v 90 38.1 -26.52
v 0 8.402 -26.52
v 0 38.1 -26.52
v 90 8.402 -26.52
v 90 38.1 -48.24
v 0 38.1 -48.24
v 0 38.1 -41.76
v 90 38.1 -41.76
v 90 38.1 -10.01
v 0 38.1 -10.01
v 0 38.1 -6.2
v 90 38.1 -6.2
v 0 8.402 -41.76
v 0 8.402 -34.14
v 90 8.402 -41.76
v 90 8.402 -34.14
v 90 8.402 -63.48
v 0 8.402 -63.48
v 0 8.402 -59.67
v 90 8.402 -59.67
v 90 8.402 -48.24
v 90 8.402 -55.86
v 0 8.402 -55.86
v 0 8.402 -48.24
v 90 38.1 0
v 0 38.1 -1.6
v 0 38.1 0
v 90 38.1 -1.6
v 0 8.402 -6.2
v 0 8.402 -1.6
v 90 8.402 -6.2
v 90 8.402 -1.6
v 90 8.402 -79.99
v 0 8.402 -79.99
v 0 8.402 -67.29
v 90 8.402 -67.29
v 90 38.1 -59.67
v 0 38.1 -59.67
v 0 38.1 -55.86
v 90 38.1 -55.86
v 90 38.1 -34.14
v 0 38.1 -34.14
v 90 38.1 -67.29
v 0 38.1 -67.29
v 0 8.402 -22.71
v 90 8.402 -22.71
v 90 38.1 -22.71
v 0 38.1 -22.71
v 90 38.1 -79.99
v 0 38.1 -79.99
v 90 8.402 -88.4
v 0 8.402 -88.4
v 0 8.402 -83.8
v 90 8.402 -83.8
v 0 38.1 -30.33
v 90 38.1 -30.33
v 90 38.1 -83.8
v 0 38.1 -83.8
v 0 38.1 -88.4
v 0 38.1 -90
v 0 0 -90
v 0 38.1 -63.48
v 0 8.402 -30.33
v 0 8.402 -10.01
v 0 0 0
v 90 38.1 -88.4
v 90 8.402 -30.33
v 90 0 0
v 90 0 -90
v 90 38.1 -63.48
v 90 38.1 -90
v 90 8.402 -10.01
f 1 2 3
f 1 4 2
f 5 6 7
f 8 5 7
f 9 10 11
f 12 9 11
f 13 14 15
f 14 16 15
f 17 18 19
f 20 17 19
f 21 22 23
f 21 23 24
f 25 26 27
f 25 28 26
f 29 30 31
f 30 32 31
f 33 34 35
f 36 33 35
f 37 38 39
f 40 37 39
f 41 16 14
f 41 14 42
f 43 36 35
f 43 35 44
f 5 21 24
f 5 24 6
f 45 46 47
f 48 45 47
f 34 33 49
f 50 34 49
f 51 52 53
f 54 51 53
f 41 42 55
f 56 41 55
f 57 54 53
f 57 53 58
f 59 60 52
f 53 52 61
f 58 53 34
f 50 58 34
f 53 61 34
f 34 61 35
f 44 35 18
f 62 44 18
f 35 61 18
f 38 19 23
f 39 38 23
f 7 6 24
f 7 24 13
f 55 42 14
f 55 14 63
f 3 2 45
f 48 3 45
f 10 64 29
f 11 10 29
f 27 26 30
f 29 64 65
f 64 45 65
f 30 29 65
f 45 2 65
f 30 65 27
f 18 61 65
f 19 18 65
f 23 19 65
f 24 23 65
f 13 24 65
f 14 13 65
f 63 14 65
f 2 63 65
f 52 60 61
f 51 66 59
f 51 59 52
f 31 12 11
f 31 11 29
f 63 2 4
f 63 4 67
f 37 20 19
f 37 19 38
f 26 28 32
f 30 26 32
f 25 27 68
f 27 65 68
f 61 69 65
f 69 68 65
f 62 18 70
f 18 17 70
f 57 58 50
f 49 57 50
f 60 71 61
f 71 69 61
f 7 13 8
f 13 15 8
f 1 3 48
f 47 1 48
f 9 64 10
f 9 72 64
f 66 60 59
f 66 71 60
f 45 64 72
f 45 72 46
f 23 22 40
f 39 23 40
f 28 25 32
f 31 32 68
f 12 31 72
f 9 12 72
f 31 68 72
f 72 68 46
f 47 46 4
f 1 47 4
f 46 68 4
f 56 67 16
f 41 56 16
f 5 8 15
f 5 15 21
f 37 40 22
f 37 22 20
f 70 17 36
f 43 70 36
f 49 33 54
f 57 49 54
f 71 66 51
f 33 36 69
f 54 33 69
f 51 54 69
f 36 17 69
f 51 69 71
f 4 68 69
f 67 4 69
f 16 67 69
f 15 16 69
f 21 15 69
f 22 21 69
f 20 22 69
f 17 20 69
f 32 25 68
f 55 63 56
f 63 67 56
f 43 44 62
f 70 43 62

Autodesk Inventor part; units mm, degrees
ref_plane "YZ Plane" through (0, 0, 0) normal (1, 0, 0) x (0, 1, 0)
ref_plane "XZ Plane" through (0, 0, 0) normal (0, 1, 0) x (-1, 0, 0)
ref_plane "XY Plane" through (0, 0, 0) normal (0, 0, 1) x (1, 0, 0)
sketch "Sketch1" plane through (0, 0, 0) normal (0, 1, 0) x (-1, 0, 0)
  line L0 (0, 0) -> (-90, 0)
  line L1 (-90, 0) -> (-90, -90)
  line L2 (-90, -90) -> (0, -90)
  line L3 (0, -90) -> (0, 0)
  dimension "d0" = 90
  dimension "d1" = 90
extrude "Extrusion1" add sketch "Sketch1" along normal blind 88.9
sketch "Sketch2" plane through (90, 0, 0) normal (1, 0, 0) x (0, 0, -1)
  line L0 (0, 0) -> (90, 0) projected
  line L1 (90, 0) -> (90, 88.9) projected
  line L2 (0, 88.9) -> (90, 88.9) projected
  line L3 (0, 0) -> (0, 88.9) projected
  line L4 (0, 88.9) -> (1.6, 88.9)
  line L5 (0, 88.9) -> (90, 88.9) projected
  line L6 (1.6, 88.9) -> (6.2, 88.9)
  line L7 (6.2, 88.9) -> (7.8, 88.9)
  line L8 (7.8, 88.9) -> (7.8, 8.402)
  line L9 (6.2, 88.9) -> (6.2, 8.402)
  line L10 (1.6, 88.9) -> (1.6, 8.402)
  line L11 (1.6, 8.402) -> (6.2, 8.402)
  line L12 (90, 88.9) -> (88.4, 88.9)
  line L13 (88.4, 88.9) -> (88.4, 8.402)
  line L14 (88.4, 8.402) -> (83.8, 8.402)
  line L15 (83.8, 8.402) -> (83.8, 88.9)
  dimension "d4" = 1.6
  dimension "d5" = 4.6
  dimension "d6" = 1.6
  dimension "d7" = 1.6
  dimension "d8" = 4.6
extrude "Extrusion2" cut sketch "Sketch2" against normal blind 127 contours L2 L9 L11 L10 | L13 L14 L15 L2
sketch "Sketch3" plane through (90, 0, 0) normal (1, 0, 0) x (0, 0, -1)
  line L0 (1.6, 8.402) -> (1.6, 88.9) projected
  line L1 (0, 88.9) -> (1.6, 88.9) projected
  line L2 (0, 0) -> (0, 88.9) projected
  line L3 (0, 0) -> (90, 0) projected
  line L4 (90, 0) -> (90, 88.9) projected
  line L5 (88.4, 88.9) -> (90, 88.9) projected
  line L6 (88.4, 88.9) -> (88.4, 8.402) projected
  line L7 (88.4, 8.402) -> (83.8, 8.402) projected
  line L8 (83.8, 8.402) -> (83.8, 88.9) projected
  line L9 (6.2, 88.9) -> (83.8, 88.9) projected
  line L10 (6.2, 88.9) -> (6.2, 8.402) projected
  line L11 (6.2, 8.402) -> (1.6, 8.402) projected
sketch "Sketch5" plane through (90, 0, 0) normal (1, 0, 0) x (0, 0, -1)
  line L0 (-0.0003, 88.9) -> (90, 88.9)
  line L1 (90, 88.9) -> (90, 38.1)
  line L2 (90, 38.1) -> (-0.0003, 38.1)
  line L3 (-0.0003, 38.1) -> (-0.0003, 88.9)
  point P0 (0, 0)
  dimension "d24" = 50.8
extrude "Extrusion3" cut sketch "Sketch5" against normal blind 111.125
sketch "Sketch6" plane through (90, 0, 0) normal (1, 0, 0) x (0, 0, -1)
  line L0 (1.6, 38.1) -> (0, 38.1) projected
  line L1 (0, 0) -> (0, 38.1) projected
  line L2 (0, 0) -> (90, 0) projected
  line L3 (90, 0) -> (90, 38.1) projected
  line L4 (90, 38.1) -> (88.4, 38.1) projected
  line L5 (88.4, 38.1) -> (88.4, 8.402) projected
  line L6 (88.4, 8.402) -> (83.8, 8.402) projected
  line L7 (83.8, 8.402) -> (83.8, 38.1) projected
  line L8 (83.8, 38.1) -> (6.2, 38.1) projected
  line L9 (6.2, 38.1) -> (6.2, 8.402) projected
  line L10 (6.2, 8.402) -> (1.6, 8.402) projected
  line L11 (1.6, 8.402) -> (1.6, 38.1) projected
  line L12 (6.2, 38.1) -> (6.2, 8.402)
  line L13 (6.2, 8.402) -> (10.01, 8.402)
  line L14 (10.01, 8.402) -> (10.01, 38.1)
  line L15 (10.01, 38.1) -> (6.2, 38.1)
  line L16 (10.01, 38.1) -> (10.01, 8.402)
  line L17 (10.01, 8.402) -> (22.71, 8.402)
  line L18 (22.71, 8.402) -> (22.71, 38.1)
  line L19 (22.71, 38.1) -> (10.01, 38.1)
  line L20 (22.71, 38.1) -> (22.71, 8.402)
  line L21 (22.71, 8.402) -> (26.52, 8.402)
  line L22 (26.52, 8.402) -> (26.52, 38.1)
  line L23 (26.52, 38.1) -> (22.71, 38.1)
  line L24 (26.52, 38.1) -> (26.52, 8.402)
  line L25 (26.52, 8.402) -> (30.33, 8.402)
  line L26 (30.33, 8.402) -> (30.33, 38.1)
  line L27 (30.33, 38.1) -> (26.52, 38.1)
  line L28 (30.33, 38.1) -> (30.33, 8.402)
  line L29 (30.33, 8.402) -> (34.14, 8.402)
  line L30 (34.14, 8.402) -> (34.14, 38.1)
  line L31 (34.14, 38.1) -> (30.33, 38.1)
  line L32 (83.8, 38.1) -> (83.8, 8.402)
  line L33 (83.8, 8.402) -> (79.99, 8.402)
  line L34 (79.99, 8.402) -> (79.99, 38.1)
  line L35 (79.99, 38.1) -> (83.8, 38.1)
  line L36 (79.99, 38.1) -> (79.99, 8.402)
  line L37 (79.99, 8.402) -> (67.29, 8.402)
  line L38 (67.29, 8.402) -> (67.29, 38.1)
  line L39 (67.29, 38.1) -> (79.99, 38.1)
  line L40 (67.29, 38.1) -> (67.29, 8.402)
  line L41 (67.29, 8.402) -> (63.48, 8.402)
  line L42 (63.48, 8.402) -> (63.48, 38.1)
  line L43 (63.48, 38.1) -> (67.29, 38.1)
  line L44 (63.48, 38.1) -> (63.48, 8.402)
  line L45 (63.48, 8.402) -> (59.67, 8.402)
  line L46 (59.67, 8.402) -> (59.67, 38.1)
  line L47 (59.67, 38.1) -> (63.48, 38.1)
  line L48 (59.67, 38.1) -> (59.67, 8.402)
  line L49 (59.67, 8.402) -> (55.86, 8.402)
  line L50 (55.86, 8.402) -> (55.86, 38.1)
  line L51 (55.86, 38.1) -> (59.67, 38.1)
  line L52 (55.86, 38.1) -> (55.86, 8.402)
  line L53 (55.86, 8.402) -> (48.24, 8.402)
  line L54 (48.24, 8.402) -> (48.24, 38.1)
  line L55 (48.24, 38.1) -> (55.86, 38.1)
  line L56 (34.14, 38.1) -> (34.14, 8.402)
  line L57 (34.14, 8.402) -> (41.76, 8.402)
  line L58 (41.76, 8.402) -> (41.76, 38.1)
  line L59 (41.76, 38.1) -> (34.14, 38.1)
  dimension "d27" = 3.81
  dimension "d28" = 12.7
  dimension "d29" = 3.81
  dimension "d30" = 3.81
  dimension "d31" = 3.81
  dimension "d32" = 3.81
  dimension "d33" = 12.7
  dimension "d34" = 3.81
  dimension "d35" = 3.81
  dimension "d36" = 3.81
  dimension "d37" = 7.62
  dimension "d38" = 7.62
extrude "Extrusion4" cut sketch "Sketch6" against normal blind 111.125 contours L14 L8 L18 L17 | L22 L8 L26 L25 | L30 L8 L58 L57 | L37 L38 L8 L34 | L45 L46 L8 L42 | L8 L50 L53 L54
properties part number "HeatSink" material "Aluminum 6061"
